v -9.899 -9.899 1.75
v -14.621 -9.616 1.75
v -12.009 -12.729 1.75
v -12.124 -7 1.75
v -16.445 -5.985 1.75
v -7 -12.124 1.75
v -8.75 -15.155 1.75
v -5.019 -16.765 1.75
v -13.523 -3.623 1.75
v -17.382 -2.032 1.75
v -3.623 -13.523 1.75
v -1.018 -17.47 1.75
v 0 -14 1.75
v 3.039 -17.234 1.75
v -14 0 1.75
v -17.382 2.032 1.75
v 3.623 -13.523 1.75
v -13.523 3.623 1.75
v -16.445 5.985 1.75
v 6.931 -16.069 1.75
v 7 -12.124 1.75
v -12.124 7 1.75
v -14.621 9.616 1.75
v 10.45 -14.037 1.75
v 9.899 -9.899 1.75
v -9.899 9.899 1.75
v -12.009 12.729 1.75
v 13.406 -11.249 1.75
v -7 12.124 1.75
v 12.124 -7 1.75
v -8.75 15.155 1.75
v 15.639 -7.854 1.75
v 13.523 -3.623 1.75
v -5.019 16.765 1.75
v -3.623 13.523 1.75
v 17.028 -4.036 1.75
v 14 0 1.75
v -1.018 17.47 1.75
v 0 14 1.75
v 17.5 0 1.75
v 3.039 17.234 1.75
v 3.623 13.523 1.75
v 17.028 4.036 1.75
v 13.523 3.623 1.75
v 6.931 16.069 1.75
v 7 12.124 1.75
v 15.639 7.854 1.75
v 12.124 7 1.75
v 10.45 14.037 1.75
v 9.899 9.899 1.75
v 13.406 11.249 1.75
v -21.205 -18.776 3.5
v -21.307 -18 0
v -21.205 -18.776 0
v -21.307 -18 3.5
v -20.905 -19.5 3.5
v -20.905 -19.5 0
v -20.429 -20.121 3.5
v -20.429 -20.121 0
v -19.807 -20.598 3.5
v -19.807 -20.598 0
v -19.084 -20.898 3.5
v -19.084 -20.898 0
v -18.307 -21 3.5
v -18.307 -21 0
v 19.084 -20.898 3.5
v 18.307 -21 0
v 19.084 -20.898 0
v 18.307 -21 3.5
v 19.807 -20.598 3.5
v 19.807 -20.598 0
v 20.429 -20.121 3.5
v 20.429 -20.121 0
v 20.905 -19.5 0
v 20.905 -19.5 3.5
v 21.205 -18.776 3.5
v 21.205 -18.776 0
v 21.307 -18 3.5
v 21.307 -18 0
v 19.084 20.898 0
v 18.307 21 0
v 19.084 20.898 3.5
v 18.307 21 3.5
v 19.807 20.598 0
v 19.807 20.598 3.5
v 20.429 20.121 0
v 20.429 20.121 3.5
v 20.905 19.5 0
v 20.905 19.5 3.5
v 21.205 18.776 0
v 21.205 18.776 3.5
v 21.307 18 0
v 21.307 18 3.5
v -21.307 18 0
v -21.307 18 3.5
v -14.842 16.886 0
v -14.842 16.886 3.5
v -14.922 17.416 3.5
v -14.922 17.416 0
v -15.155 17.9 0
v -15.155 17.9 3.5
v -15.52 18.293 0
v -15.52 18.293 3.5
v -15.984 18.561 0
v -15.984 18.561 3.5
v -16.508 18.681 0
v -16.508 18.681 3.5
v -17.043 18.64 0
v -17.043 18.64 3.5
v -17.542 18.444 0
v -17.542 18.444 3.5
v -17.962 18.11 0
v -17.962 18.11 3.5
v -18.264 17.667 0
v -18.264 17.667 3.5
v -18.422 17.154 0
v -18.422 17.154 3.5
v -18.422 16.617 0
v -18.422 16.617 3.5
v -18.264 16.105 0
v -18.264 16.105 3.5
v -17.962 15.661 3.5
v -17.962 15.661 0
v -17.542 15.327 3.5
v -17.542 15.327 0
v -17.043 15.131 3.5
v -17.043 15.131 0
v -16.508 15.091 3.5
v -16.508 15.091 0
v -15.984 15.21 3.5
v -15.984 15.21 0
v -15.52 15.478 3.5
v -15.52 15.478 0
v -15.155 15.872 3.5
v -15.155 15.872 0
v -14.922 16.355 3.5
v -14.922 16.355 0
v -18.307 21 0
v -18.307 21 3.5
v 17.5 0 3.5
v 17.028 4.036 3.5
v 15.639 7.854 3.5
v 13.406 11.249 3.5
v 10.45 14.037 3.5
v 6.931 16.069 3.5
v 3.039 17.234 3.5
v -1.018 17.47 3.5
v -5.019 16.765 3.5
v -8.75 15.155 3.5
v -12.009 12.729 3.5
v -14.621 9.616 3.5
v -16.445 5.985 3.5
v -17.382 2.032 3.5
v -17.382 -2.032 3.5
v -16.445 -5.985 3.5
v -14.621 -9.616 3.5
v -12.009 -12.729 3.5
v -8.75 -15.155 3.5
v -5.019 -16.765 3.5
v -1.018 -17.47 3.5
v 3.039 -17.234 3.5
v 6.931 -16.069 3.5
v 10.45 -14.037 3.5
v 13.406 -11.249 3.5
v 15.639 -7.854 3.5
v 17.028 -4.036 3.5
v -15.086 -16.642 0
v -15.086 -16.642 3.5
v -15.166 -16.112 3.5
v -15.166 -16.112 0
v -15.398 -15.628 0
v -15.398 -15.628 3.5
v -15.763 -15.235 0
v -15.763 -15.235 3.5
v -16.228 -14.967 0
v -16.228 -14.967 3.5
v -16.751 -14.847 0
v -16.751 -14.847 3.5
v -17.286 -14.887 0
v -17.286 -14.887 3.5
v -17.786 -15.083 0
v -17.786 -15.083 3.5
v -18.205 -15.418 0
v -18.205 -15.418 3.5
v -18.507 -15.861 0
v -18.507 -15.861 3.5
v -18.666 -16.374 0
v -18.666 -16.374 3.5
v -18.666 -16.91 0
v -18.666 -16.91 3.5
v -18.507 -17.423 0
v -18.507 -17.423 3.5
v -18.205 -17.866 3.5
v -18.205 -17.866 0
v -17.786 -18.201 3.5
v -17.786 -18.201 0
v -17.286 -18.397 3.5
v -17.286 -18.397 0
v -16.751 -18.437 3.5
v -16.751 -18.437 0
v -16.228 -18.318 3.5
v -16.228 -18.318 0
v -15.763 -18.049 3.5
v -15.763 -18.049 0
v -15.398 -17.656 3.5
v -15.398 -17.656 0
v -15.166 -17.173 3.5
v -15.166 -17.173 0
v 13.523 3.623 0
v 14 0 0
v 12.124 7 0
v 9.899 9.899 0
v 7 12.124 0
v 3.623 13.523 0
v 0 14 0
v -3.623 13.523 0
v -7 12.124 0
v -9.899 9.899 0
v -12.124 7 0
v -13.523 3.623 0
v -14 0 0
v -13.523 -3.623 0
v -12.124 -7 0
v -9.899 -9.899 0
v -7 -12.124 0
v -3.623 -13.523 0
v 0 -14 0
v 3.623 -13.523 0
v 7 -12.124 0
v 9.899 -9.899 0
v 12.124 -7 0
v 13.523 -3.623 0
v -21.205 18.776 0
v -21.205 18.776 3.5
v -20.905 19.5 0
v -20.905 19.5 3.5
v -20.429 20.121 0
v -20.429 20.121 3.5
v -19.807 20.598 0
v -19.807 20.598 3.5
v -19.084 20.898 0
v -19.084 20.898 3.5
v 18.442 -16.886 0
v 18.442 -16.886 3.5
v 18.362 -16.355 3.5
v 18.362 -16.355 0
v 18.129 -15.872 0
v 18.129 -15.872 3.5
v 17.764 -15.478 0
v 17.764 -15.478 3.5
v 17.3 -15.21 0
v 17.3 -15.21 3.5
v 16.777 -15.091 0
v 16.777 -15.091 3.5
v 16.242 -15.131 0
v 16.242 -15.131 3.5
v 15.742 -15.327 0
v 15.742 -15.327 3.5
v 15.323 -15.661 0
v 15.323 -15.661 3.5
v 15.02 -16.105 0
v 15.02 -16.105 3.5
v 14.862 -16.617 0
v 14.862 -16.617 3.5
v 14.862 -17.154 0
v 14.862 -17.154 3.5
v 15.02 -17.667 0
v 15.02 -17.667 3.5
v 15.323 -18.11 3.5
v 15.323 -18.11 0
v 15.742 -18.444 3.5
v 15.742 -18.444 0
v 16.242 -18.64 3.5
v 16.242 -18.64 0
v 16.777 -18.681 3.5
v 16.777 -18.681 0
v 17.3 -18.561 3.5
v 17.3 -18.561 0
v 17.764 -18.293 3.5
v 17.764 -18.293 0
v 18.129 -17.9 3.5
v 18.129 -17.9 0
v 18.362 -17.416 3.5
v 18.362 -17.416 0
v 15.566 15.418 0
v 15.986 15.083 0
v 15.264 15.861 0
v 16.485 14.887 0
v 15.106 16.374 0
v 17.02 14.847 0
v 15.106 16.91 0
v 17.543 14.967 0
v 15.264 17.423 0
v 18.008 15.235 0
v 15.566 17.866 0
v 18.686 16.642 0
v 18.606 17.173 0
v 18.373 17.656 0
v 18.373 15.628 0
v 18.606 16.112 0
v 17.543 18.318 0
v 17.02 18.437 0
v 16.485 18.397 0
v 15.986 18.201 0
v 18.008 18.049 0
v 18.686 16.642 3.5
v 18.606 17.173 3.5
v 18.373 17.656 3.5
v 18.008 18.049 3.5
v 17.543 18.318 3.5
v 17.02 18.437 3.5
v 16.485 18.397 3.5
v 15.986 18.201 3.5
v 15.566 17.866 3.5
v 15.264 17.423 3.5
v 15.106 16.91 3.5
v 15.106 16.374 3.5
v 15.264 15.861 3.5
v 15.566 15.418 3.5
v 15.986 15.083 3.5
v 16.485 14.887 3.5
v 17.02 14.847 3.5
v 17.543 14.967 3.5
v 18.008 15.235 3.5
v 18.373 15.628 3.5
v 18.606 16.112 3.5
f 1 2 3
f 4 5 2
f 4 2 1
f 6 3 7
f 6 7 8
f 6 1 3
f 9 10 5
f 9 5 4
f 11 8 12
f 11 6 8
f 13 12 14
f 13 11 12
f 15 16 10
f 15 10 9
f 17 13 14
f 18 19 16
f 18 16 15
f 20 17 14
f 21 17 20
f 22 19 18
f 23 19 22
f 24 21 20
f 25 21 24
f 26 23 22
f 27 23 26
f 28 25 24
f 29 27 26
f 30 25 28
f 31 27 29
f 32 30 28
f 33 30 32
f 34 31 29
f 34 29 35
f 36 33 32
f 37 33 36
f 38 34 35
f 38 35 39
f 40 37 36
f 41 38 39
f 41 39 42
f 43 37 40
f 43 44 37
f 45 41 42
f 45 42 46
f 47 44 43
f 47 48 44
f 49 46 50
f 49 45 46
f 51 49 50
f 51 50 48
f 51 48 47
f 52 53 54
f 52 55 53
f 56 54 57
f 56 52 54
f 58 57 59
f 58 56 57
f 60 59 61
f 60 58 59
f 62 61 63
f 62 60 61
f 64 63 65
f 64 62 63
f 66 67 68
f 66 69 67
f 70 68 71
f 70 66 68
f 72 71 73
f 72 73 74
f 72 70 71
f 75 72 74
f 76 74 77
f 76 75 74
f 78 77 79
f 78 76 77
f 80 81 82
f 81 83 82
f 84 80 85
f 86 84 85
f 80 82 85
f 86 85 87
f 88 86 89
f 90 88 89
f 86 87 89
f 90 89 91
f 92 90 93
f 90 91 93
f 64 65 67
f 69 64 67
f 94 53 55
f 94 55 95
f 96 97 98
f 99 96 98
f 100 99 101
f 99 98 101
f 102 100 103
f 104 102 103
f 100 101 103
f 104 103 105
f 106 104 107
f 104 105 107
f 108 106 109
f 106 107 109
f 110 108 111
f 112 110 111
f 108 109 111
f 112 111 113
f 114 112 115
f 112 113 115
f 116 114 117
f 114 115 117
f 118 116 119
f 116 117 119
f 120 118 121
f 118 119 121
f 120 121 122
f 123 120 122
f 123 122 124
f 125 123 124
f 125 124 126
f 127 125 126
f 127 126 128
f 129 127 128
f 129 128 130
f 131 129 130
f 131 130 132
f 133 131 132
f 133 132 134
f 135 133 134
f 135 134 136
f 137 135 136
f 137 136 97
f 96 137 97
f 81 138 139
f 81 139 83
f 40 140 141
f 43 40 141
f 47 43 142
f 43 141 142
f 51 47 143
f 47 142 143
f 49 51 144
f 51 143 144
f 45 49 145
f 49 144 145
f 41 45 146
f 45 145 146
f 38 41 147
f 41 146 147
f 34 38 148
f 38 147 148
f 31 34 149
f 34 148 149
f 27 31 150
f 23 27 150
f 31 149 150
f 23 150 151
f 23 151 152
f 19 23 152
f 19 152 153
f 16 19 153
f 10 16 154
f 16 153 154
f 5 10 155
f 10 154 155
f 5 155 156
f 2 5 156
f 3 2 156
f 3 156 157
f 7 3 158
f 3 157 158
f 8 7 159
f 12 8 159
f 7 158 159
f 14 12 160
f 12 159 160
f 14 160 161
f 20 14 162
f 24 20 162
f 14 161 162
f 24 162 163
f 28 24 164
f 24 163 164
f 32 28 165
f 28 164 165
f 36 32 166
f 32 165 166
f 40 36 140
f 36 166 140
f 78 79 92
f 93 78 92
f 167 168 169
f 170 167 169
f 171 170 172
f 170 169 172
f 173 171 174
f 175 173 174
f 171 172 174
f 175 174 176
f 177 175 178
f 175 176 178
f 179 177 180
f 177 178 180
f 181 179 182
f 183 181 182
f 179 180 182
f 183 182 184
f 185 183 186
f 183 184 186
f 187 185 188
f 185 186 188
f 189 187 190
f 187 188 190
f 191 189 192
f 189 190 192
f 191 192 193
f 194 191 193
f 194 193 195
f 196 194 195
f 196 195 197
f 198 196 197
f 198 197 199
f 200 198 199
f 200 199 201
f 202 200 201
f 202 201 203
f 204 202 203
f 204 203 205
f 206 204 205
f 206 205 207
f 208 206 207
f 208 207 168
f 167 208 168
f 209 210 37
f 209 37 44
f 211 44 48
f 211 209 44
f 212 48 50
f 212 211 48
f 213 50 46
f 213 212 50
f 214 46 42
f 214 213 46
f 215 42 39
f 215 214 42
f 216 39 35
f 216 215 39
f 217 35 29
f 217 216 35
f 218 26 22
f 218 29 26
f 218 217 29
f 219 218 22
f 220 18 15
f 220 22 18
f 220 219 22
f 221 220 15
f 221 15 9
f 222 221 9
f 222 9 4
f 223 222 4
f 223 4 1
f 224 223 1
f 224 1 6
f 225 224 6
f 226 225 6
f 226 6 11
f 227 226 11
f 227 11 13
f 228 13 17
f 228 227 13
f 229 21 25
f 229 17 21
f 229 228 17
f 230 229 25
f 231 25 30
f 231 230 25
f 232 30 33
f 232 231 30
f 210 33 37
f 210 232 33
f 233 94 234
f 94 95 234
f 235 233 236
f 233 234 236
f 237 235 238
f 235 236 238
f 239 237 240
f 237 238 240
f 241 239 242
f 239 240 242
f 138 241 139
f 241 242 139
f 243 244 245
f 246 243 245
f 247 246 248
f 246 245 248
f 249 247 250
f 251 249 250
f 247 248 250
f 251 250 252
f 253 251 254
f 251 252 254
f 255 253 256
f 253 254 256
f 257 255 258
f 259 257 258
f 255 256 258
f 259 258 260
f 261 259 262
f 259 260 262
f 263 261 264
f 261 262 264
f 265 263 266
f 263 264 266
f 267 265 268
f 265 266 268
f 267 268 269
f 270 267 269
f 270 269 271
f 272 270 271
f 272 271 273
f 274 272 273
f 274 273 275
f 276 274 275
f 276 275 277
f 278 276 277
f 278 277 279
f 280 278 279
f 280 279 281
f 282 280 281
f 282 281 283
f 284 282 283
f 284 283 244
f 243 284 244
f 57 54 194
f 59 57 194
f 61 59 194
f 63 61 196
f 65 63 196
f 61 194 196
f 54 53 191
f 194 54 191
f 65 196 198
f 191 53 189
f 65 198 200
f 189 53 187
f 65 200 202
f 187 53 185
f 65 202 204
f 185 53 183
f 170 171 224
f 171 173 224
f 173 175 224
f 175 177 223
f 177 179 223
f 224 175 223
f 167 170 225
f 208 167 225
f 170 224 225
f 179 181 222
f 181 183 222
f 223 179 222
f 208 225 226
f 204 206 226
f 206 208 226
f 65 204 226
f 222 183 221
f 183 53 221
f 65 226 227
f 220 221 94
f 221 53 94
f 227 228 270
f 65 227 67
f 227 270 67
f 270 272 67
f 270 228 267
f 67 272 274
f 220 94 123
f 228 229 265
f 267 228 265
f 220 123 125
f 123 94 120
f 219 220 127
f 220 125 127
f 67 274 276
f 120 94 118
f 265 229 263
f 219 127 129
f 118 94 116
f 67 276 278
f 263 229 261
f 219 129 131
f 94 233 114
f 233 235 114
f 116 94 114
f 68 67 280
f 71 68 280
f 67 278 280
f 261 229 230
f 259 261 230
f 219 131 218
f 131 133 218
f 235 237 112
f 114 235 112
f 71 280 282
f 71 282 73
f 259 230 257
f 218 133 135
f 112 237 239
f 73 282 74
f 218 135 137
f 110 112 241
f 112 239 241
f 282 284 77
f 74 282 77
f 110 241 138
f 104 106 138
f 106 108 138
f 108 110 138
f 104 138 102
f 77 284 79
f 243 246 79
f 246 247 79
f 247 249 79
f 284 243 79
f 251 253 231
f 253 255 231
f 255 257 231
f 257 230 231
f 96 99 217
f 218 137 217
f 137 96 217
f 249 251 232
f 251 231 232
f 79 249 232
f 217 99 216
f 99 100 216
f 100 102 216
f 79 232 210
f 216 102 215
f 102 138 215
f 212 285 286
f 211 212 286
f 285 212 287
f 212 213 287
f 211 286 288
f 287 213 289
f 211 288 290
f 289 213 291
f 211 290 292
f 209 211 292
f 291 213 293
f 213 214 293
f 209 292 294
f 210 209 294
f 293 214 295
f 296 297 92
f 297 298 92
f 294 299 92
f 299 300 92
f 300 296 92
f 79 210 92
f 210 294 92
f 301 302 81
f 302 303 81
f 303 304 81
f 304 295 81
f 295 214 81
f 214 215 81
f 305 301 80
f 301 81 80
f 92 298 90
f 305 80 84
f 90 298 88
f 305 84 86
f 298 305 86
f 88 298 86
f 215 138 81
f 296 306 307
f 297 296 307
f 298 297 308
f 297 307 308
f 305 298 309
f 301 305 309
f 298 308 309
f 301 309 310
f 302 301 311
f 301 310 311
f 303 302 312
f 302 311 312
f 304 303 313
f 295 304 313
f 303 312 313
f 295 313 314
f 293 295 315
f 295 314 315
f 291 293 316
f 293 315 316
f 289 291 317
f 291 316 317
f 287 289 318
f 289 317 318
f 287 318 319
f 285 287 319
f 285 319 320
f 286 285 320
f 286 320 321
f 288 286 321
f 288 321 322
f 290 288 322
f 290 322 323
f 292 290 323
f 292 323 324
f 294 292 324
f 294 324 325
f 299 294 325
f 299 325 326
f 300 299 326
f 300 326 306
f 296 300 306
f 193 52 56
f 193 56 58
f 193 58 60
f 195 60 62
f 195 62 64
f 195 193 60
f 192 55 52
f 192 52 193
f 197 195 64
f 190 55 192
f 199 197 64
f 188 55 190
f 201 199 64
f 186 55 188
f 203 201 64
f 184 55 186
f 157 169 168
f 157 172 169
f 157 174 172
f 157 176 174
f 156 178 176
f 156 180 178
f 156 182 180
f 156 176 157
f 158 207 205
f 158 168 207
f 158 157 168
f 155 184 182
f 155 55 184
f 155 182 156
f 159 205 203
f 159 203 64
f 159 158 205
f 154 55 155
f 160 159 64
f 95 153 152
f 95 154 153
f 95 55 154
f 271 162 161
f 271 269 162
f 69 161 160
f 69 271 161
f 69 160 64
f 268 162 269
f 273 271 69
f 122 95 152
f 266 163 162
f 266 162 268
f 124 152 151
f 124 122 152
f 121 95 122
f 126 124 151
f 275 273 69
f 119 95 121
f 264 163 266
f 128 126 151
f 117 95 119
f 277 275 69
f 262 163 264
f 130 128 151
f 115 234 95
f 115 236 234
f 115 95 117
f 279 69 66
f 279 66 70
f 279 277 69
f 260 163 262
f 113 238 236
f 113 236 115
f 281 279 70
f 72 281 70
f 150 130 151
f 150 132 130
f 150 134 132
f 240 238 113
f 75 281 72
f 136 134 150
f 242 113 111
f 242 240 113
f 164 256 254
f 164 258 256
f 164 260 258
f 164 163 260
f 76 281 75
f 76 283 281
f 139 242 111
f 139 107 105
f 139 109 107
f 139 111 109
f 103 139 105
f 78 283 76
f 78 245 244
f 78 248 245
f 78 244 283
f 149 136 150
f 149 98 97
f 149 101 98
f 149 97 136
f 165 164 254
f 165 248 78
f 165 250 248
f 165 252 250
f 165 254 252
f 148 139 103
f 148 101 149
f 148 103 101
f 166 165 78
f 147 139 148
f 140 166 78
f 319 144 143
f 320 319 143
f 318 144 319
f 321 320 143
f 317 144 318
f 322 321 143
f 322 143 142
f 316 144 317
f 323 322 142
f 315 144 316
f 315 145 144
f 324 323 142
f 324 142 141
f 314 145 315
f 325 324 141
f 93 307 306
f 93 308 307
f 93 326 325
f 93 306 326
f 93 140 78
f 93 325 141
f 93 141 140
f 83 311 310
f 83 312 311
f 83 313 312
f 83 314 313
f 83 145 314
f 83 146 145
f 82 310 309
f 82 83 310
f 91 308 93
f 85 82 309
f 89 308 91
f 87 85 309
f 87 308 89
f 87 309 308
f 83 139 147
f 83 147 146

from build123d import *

# Parameters (mm, degrees)
SKETCH1_W            = 42.614634146
SKETCH1_H            = 42
SKETCH1_R            = 14
BOSS_EXTRUDE1_DEPTH  = 3.5
SKETCH2_R            = 17.5
CUT_EXTRUDE1_DEPTH   = 1.75
M3_CLEARANCE_HOLE1_D = 3.6
FILLET1_R            = 3


with BuildPart() as part:
    # Sketch1 → Boss-Extrude1 (new body)
    with BuildSketch(Plane.XY):
        Rectangle(SKETCH1_W, SKETCH1_H)
        Circle(SKETCH1_R, mode=Mode.SUBTRACT)
    extrude(amount=BOSS_EXTRUDE1_DEPTH)

    # Sketch2 → Cut-Extrude1 (cut)
    with BuildSketch(Plane.XY.offset(3.5)):
        Circle(SKETCH2_R)
    extrude(amount=-CUT_EXTRUDE1_DEPTH, mode=Mode.SUBTRACT)

    # M3 Clearance Hole1 (through all)
    with Locations(Plane(origin=(0, 0, 0), x_dir=(-1, 0, 0), z_dir=(0, 0, -1))):
        with Locations((-16.642079068, -16.885621688), (-16.885621688, 16.642079068), (16.642079068, 16.885621688), (16.885621688, -16.642079068)):
            Hole(M3_CLEARANCE_HOLE1_D / 2)

    # Fillet1
    fillet1_edges = [part.edges().sort_by_distance(p)[0] for p in [
        (-21.307317073, 21, 1.75),
        (21.307317073, 21, 1.75),
        (21.307317073, -21, 1.75),
        (-21.307317073, -21, 1.75),
    ]]
    fillet(fillet1_edges, radius=FILLET1_R)


solid = part.part
